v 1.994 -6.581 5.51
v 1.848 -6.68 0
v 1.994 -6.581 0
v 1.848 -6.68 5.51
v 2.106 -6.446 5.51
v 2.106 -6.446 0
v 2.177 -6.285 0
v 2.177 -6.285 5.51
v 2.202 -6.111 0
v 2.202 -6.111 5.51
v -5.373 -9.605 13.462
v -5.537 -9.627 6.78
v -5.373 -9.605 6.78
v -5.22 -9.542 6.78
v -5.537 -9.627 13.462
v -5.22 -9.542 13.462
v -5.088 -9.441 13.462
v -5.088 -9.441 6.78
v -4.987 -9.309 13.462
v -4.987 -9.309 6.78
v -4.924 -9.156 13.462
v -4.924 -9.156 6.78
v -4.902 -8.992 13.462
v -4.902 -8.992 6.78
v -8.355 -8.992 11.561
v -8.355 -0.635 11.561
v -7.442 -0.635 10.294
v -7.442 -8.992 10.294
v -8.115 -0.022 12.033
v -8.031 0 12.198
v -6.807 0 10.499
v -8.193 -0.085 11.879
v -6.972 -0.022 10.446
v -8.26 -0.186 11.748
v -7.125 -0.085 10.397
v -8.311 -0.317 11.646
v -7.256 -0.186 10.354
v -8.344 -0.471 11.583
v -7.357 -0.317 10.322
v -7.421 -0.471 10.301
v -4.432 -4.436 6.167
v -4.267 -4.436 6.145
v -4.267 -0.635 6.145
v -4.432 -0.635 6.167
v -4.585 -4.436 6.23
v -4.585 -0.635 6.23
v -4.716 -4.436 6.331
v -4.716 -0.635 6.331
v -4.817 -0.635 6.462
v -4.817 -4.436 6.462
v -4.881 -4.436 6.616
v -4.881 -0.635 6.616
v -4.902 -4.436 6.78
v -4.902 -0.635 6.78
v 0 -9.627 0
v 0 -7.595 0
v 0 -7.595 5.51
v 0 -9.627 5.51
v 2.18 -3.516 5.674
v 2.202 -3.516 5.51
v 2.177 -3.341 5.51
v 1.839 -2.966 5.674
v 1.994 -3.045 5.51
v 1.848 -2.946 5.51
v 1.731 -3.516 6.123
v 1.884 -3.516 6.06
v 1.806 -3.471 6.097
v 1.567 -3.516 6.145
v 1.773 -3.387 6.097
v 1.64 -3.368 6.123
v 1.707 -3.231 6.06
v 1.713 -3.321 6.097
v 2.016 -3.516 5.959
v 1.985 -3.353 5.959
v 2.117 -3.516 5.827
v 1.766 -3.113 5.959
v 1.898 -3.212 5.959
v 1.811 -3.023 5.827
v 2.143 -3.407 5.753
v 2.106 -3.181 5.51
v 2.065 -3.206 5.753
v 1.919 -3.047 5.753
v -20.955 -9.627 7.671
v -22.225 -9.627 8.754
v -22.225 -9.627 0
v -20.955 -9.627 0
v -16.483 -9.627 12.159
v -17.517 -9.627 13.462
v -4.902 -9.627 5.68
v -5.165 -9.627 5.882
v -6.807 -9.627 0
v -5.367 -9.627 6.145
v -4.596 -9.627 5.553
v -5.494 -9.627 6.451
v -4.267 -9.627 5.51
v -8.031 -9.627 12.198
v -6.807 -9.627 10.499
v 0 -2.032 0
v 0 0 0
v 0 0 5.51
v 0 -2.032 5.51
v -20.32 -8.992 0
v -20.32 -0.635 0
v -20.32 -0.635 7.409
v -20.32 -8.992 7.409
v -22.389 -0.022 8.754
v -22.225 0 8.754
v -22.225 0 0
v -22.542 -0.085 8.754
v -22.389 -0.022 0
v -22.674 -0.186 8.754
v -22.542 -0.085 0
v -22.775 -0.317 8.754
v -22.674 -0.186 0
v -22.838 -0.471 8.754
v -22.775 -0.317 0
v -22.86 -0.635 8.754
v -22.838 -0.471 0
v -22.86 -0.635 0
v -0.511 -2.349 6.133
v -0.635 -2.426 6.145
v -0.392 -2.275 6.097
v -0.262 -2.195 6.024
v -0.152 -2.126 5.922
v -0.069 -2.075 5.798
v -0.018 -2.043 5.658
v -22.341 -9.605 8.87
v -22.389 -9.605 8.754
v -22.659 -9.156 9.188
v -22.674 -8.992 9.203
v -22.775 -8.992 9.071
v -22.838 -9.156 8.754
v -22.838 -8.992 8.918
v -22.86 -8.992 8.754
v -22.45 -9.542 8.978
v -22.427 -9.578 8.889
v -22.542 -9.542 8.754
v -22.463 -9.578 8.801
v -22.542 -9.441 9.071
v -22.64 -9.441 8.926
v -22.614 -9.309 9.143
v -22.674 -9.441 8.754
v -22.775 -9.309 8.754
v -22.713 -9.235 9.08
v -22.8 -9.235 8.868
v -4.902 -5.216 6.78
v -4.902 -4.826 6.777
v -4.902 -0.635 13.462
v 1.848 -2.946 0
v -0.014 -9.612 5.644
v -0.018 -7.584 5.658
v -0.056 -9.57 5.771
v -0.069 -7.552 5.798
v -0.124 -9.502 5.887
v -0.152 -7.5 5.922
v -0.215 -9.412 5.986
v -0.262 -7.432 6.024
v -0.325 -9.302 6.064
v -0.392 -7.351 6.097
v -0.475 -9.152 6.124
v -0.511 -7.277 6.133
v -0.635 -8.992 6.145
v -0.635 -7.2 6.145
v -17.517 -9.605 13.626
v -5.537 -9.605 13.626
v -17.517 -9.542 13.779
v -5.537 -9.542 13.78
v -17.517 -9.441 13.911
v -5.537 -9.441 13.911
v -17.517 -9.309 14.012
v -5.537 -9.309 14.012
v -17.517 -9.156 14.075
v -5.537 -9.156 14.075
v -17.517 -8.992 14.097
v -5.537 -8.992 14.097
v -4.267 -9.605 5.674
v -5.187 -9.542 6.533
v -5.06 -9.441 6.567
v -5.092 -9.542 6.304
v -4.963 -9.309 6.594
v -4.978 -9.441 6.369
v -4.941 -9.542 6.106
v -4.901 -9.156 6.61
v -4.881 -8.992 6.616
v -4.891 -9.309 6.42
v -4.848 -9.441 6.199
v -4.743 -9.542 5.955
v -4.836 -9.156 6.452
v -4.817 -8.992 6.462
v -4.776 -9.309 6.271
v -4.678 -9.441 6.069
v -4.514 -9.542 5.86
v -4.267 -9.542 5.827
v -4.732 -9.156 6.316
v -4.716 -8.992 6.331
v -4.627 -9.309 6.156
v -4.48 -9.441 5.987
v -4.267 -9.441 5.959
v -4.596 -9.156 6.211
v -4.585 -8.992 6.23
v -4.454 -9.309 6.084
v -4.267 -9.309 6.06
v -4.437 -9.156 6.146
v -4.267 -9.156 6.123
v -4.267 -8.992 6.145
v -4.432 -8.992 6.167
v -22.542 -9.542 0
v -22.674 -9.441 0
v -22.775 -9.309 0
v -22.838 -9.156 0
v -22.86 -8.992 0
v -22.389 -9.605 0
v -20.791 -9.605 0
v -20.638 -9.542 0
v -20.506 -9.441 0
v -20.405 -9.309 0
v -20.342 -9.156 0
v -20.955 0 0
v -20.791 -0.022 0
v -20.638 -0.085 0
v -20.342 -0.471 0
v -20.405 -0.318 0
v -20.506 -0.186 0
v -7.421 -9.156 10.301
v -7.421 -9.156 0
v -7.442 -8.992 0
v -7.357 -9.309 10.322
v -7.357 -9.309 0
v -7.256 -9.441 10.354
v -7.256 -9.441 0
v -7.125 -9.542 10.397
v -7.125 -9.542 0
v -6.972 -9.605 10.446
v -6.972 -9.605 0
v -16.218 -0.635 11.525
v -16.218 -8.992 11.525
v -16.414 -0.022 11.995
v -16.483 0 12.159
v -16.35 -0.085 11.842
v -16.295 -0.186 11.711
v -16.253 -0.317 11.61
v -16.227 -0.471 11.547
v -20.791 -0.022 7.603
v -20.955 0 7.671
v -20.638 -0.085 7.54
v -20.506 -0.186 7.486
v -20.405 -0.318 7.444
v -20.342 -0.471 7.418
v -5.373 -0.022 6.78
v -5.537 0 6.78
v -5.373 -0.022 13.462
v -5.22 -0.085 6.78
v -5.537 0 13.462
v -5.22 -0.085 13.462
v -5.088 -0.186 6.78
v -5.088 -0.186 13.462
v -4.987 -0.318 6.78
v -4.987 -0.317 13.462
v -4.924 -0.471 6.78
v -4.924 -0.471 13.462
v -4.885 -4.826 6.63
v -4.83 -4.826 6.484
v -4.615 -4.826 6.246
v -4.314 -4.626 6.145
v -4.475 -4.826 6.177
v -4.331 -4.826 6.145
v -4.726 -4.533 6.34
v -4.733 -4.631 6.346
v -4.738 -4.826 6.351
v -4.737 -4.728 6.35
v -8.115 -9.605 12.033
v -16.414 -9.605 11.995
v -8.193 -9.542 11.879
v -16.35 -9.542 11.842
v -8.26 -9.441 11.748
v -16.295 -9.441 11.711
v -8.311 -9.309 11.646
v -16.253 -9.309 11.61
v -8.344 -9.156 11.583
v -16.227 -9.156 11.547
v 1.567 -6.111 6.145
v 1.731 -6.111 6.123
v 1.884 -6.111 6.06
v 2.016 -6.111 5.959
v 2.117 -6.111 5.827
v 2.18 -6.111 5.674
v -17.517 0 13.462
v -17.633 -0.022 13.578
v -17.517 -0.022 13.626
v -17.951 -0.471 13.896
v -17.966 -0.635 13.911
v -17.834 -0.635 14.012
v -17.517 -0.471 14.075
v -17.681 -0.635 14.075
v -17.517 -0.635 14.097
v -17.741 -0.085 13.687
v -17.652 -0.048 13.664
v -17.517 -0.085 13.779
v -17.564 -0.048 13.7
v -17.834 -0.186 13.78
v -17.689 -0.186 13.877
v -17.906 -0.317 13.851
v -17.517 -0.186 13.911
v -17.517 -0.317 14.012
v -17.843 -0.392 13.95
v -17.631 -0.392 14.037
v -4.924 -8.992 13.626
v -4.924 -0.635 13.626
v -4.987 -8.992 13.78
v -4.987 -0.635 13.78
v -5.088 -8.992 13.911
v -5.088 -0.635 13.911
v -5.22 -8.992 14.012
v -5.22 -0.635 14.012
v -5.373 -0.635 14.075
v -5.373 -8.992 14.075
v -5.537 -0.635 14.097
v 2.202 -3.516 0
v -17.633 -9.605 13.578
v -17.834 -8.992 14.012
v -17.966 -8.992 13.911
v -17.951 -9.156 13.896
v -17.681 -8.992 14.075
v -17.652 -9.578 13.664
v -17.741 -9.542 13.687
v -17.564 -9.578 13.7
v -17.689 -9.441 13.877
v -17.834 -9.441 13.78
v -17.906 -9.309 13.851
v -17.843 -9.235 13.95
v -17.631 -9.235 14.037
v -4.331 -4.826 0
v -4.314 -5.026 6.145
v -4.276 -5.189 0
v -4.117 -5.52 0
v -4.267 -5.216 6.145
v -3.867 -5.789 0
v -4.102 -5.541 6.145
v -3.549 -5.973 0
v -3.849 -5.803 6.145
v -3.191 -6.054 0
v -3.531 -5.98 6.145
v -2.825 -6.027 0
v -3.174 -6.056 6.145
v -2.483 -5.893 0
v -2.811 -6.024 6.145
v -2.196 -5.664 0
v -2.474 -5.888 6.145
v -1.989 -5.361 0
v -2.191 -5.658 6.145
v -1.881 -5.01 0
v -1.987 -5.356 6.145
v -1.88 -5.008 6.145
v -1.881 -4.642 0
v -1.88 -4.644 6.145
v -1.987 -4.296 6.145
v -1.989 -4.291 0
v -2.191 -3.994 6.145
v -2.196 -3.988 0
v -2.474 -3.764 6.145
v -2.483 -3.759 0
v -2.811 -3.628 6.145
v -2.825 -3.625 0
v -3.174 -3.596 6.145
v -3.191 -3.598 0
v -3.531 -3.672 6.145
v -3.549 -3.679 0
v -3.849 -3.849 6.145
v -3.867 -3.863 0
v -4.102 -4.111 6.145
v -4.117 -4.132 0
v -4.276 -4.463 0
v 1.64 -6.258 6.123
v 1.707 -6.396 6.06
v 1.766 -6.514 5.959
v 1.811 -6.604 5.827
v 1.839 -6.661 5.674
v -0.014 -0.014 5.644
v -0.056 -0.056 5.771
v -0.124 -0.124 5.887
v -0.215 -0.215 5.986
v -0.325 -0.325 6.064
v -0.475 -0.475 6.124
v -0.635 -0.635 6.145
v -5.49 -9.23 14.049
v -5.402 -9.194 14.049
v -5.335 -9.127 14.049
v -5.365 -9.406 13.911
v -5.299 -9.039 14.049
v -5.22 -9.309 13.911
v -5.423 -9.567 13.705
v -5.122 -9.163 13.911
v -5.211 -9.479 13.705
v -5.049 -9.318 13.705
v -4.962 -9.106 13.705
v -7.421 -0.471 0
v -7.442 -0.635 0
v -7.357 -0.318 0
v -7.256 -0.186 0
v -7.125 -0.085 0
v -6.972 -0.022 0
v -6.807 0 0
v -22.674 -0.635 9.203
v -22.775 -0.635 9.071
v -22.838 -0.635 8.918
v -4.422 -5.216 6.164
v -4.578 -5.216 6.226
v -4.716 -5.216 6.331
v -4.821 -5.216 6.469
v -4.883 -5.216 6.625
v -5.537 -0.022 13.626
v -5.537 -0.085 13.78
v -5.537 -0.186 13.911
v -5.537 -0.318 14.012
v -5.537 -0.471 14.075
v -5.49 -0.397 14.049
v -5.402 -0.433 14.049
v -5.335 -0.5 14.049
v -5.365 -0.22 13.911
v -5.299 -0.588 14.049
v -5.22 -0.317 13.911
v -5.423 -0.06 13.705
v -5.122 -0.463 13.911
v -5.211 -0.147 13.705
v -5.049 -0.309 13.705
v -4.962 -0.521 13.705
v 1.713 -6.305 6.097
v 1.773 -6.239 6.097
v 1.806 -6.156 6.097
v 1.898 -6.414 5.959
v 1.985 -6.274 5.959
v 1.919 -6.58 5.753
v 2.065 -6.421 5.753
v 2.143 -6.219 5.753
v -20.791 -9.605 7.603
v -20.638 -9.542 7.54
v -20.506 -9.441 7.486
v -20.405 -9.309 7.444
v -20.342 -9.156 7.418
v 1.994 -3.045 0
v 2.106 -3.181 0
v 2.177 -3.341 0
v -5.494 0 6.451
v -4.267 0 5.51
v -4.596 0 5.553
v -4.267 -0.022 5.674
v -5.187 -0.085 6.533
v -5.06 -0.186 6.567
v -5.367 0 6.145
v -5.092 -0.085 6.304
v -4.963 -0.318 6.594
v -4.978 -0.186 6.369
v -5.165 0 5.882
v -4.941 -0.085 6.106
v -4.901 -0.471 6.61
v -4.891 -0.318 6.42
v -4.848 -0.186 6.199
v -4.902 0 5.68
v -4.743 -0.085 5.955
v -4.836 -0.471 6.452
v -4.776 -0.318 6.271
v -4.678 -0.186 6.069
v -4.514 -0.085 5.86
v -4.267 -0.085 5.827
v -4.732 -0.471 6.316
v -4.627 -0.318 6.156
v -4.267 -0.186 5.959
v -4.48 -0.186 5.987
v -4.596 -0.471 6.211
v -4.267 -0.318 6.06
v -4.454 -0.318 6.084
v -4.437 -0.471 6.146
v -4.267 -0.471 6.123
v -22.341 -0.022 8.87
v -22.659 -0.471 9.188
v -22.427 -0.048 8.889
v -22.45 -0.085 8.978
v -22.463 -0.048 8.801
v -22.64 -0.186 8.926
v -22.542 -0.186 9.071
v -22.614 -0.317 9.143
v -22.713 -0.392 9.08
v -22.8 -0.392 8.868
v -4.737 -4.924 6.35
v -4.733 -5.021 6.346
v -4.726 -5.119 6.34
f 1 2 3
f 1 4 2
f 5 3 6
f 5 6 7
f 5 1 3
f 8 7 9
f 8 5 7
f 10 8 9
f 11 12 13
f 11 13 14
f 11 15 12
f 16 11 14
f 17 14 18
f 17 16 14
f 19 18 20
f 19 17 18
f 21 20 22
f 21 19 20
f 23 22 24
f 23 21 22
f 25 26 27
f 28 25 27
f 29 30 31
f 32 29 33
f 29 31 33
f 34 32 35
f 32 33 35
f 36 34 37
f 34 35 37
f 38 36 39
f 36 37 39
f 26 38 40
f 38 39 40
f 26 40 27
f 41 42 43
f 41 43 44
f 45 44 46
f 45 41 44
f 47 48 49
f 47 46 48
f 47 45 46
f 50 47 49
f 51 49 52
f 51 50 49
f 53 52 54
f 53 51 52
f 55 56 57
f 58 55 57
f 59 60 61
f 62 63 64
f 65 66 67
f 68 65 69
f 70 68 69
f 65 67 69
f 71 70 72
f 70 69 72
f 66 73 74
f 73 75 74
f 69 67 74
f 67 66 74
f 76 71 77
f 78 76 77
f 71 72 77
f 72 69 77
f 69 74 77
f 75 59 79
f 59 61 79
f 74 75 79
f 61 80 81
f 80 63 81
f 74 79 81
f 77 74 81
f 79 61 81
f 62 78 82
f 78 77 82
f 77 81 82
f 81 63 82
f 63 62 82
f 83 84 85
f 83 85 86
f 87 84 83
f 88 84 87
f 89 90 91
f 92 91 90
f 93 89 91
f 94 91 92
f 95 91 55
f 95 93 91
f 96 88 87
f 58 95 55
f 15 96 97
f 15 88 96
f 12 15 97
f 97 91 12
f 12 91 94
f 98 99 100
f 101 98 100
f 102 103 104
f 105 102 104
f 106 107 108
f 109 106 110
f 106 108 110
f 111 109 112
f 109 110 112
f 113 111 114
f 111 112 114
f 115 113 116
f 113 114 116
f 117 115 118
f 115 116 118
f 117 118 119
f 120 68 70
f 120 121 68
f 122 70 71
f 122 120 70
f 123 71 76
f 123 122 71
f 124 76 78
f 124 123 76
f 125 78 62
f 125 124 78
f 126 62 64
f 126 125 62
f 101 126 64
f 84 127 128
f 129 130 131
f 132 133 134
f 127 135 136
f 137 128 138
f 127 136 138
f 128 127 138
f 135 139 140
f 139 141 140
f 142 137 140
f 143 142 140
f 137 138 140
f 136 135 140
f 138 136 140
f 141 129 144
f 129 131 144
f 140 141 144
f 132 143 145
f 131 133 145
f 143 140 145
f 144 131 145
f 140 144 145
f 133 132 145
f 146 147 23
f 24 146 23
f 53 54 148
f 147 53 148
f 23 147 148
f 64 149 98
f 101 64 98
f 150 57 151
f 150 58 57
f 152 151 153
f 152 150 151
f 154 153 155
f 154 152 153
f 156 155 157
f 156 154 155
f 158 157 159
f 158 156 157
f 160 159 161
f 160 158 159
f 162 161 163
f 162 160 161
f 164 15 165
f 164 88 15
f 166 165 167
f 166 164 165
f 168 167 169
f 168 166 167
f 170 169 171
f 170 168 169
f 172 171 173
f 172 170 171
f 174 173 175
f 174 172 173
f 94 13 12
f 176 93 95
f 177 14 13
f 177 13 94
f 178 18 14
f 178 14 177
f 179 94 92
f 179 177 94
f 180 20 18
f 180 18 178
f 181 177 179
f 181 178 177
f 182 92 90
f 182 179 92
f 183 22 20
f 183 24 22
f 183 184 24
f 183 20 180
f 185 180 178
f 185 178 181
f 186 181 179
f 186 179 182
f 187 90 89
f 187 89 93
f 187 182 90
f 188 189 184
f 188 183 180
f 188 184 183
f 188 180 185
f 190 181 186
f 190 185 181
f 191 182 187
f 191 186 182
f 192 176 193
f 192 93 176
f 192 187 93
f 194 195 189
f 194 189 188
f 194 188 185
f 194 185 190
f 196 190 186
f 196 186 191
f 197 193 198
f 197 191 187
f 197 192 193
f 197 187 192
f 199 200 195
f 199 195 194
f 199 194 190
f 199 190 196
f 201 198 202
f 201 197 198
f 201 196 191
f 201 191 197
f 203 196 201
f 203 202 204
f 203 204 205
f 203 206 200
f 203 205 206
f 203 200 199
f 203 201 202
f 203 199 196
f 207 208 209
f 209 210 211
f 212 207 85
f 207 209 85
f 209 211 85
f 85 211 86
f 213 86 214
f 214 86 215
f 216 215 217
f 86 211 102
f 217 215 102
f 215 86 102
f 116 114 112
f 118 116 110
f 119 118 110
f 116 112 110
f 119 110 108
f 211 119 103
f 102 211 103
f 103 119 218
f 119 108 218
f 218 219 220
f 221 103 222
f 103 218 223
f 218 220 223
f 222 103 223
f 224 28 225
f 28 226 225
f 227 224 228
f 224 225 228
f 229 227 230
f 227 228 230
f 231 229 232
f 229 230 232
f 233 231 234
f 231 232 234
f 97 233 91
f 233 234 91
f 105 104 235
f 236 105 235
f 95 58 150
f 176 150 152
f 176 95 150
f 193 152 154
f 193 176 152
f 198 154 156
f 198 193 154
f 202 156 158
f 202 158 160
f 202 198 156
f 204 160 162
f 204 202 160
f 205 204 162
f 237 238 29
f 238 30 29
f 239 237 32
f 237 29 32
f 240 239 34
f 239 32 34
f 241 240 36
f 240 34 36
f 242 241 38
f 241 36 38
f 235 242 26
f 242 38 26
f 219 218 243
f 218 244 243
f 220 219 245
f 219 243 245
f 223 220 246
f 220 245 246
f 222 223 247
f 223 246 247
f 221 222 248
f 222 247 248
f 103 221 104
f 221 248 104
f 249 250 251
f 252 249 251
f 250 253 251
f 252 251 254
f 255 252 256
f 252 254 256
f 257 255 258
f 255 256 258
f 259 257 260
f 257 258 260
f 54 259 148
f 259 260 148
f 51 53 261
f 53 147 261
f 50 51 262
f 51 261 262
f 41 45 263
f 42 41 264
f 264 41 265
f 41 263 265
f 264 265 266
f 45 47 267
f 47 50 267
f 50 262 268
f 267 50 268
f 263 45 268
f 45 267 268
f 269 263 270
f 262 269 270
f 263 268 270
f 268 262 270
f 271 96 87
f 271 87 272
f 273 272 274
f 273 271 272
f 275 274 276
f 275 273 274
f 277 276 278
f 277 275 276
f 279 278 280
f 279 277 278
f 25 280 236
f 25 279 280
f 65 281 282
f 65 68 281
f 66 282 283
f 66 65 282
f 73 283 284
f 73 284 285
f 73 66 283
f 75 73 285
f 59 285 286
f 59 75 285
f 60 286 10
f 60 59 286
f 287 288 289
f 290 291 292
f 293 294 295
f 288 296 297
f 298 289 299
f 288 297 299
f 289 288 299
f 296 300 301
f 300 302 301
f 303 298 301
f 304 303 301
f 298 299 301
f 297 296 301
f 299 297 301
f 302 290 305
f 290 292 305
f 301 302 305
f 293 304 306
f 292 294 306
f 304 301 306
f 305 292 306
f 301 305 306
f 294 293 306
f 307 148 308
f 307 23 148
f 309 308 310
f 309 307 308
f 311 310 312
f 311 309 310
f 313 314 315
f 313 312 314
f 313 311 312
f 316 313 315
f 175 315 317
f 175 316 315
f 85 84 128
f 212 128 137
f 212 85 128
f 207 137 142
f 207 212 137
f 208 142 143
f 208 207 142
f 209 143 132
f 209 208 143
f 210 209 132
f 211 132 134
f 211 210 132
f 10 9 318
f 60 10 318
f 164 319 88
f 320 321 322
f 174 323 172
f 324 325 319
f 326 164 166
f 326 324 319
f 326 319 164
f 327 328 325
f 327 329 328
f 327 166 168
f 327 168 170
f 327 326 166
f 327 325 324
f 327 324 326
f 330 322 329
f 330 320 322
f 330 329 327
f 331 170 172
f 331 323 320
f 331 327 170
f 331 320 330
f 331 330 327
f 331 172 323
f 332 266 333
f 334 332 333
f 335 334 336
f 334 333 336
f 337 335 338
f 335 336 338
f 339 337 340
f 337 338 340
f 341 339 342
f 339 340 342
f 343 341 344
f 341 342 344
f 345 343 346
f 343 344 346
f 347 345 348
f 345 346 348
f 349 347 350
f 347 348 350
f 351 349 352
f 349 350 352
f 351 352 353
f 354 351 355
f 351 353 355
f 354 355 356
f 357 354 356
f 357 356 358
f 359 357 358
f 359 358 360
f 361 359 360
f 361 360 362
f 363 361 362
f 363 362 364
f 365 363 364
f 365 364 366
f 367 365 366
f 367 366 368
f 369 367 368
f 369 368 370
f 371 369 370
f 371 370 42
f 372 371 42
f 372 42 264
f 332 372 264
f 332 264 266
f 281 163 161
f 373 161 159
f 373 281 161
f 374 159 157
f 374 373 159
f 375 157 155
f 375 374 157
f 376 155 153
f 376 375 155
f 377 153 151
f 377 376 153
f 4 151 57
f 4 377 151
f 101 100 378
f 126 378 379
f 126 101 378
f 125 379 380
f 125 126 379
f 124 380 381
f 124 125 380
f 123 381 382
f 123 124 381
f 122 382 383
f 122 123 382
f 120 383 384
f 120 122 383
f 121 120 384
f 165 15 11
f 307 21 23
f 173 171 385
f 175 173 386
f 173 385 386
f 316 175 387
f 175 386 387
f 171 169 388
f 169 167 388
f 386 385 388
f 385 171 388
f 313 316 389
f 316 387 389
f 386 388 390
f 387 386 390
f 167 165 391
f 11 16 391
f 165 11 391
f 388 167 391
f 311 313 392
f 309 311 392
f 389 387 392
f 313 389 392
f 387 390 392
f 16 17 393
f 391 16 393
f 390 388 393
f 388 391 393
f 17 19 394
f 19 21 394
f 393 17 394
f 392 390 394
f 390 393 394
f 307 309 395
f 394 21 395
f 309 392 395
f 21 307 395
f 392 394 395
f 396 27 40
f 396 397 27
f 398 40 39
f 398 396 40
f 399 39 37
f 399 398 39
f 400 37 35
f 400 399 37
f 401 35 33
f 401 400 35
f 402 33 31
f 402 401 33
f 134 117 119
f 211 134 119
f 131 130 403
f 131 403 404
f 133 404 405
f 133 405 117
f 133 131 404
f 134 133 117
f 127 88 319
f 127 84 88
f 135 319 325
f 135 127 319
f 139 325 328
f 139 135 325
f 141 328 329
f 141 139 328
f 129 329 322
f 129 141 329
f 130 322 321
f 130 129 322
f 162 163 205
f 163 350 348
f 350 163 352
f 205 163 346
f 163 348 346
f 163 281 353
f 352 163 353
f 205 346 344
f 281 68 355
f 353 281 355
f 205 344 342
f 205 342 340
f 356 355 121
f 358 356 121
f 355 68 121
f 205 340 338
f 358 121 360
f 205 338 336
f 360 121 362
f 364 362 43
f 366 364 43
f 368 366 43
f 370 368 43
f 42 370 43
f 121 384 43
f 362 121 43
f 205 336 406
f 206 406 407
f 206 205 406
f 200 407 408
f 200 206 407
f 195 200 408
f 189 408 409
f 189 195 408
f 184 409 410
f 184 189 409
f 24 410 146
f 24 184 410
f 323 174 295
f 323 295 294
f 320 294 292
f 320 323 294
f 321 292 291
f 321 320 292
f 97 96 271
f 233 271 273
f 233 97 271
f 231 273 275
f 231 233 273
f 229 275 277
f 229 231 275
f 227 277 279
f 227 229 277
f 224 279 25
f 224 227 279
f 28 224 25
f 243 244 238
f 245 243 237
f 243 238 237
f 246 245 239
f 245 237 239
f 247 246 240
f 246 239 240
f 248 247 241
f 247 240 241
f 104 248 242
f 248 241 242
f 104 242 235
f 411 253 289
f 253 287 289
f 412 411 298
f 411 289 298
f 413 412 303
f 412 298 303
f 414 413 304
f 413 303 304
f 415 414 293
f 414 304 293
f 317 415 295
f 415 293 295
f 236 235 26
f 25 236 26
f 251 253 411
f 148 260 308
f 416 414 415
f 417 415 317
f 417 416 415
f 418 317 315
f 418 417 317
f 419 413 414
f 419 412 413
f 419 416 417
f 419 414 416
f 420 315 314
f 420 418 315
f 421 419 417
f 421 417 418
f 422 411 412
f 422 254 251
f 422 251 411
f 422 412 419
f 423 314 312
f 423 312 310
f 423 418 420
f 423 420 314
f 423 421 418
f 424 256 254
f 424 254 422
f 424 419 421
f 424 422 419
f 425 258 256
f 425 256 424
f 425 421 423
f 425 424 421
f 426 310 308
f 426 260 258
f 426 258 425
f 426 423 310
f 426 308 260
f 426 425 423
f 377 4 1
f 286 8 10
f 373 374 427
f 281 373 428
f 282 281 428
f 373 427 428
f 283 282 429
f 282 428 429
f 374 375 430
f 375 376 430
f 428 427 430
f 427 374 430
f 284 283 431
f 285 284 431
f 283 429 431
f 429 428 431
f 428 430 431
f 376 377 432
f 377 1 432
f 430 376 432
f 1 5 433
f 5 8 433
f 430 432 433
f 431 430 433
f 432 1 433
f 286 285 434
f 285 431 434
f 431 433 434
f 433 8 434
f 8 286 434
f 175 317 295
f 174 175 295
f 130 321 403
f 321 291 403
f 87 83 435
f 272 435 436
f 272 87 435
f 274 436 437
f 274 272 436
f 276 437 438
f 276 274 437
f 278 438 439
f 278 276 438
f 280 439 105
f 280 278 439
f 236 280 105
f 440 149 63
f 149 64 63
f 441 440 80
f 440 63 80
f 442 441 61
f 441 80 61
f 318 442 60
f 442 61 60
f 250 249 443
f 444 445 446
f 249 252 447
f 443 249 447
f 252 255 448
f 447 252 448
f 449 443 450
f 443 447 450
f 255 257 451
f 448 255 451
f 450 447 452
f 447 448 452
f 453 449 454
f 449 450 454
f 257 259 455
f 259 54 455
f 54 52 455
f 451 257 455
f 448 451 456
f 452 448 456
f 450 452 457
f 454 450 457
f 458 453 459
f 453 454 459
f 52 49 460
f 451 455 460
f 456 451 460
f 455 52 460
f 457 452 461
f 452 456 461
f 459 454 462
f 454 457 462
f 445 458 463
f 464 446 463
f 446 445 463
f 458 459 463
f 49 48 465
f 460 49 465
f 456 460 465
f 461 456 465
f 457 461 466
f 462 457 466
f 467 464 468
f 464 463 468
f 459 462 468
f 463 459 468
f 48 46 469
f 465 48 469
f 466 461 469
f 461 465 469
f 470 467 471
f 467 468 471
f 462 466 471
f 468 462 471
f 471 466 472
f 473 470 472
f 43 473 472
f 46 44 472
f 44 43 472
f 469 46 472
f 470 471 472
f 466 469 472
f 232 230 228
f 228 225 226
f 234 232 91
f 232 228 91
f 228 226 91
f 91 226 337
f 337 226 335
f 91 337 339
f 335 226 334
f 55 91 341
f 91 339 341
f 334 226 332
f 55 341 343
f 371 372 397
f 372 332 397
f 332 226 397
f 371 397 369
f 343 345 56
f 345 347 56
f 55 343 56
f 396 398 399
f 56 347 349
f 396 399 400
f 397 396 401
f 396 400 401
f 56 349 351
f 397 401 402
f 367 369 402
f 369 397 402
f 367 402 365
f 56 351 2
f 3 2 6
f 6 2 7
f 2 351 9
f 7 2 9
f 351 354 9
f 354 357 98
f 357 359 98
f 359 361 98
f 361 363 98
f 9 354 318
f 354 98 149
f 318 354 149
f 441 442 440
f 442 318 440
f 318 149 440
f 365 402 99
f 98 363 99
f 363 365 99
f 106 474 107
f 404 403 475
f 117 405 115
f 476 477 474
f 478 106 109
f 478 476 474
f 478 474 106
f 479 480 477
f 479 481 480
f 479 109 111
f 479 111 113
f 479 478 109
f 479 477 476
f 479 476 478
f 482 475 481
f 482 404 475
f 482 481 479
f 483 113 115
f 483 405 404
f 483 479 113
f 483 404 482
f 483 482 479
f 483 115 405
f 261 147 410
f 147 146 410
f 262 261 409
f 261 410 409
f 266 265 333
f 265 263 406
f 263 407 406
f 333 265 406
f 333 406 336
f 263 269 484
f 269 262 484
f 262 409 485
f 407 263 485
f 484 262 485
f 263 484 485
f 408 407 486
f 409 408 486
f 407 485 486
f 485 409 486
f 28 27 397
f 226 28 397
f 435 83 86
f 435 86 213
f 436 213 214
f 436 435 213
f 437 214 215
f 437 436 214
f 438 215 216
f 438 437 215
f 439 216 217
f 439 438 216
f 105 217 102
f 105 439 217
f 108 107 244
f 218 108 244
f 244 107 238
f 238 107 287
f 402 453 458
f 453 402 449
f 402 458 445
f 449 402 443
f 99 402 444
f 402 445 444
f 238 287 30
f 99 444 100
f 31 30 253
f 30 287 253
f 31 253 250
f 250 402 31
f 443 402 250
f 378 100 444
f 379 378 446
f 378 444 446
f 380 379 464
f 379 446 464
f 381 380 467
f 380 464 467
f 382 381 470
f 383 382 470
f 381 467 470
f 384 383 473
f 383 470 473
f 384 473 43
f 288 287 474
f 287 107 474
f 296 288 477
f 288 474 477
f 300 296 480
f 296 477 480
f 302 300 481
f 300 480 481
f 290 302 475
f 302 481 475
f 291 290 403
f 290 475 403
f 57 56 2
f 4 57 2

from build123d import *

# Parameters (mm, degrees)
F1_DEPTH = 9.6266
F3_D     = 2.4638
F5_DEPTH = 6.1449664227
F6_R     = 0.635


# Not quite as in the source:
# - a feature names something its author has since deleted; it is built from what else it names


with BuildPart() as f1:
    # F0 (on Front) → F1 (new body)
    with BuildSketch(Plane.XZ):
        Polygon((-7.4422, 0), (0, 0), (0, 6.1449664227), (-4.9022, 6.1449664227), (-4.9022, 14.097), (-17.78, 14.097), (-22.86, 9.017), (-22.86, 0), (-20.32, 0), (-20.32, 7.4086618234), (-16.2178584248, 11.5251476239), (-8.3548940885, 11.5611667216), (-7.4422, 10.294130072), align=None)
    extrude(amount=F1_DEPTH)

    # F3 (through all)
    with Locations(Plane(origin=(0, 0, 0), x_dir=(1, 0, 0), z_dir=(0, 0, -1))):
        with Locations((-3.0988, 4.826)):
            Hole(F3_D / 2)

    # F4 (on Top) → F5 (join, through all)
    with BuildSketch(Plane.XY):
        Polygon((0, -2.032), (0, -7.5946), (2.2016586276, -6.5053654334), (2.2016586276, -3.1212345666), align=None)
    extrude(amount=F5_DEPTH)

    # F6
    f6_edges = [f1.edges().sort_by_distance(p)[0] for p in [
        (-7.4422, 0, 5.147065),
        (-7.898547, 0, 10.927648),
        (-12.286376, 0, 11.543157),
        (-20.32, 0, 3.704331),
        (-20.32, -9.6266, 3.704331),
        (-12.286376, -9.6266, 11.543157),
        (-7.898547, -9.6266, 10.927648),
        (-7.4422, -9.6266, 5.147065),
        (-4.9022, 0, 10.120983),
        (-4.9022, -9.6266, 10.120983),
        (0, -1.016, 6.144966),
        (0, -8.6106, 6.144966),
        (-2.4511, 0, 6.144966),
        (-2.4511, -9.6266, 6.144966),
        (-20.32, -9.6266, 11.557),
        (-22.86, -9.6266, 4.5085),
        (-18.268929, -9.6266, 9.466905),
        (-20.32, 0, 11.557),
        (-22.86, 0, 4.5085),
        (-18.268929, 0, 9.466905),
        (-11.3411, 0, 14.097),
        (-11.3411, -9.6266, 14.097),
        (-17.78, -4.8133, 14.097),
        (-22.86, -4.8133, 9.017),
        (1.100829, -7.049983, 6.144966),
        (2.201659, -4.8133, 6.144966),
        (1.100829, -2.576617, 6.144966),
        (2.201659, -6.505365, 3.072483),
        (2.201659, -3.121235, 3.072483),
        (-4.9022, -4.8133, 6.144966),
        (-4.9022, -4.8133, 14.097),
    ]]
    fillet(f6_edges, radius=F6_R)


solid = f1.part
